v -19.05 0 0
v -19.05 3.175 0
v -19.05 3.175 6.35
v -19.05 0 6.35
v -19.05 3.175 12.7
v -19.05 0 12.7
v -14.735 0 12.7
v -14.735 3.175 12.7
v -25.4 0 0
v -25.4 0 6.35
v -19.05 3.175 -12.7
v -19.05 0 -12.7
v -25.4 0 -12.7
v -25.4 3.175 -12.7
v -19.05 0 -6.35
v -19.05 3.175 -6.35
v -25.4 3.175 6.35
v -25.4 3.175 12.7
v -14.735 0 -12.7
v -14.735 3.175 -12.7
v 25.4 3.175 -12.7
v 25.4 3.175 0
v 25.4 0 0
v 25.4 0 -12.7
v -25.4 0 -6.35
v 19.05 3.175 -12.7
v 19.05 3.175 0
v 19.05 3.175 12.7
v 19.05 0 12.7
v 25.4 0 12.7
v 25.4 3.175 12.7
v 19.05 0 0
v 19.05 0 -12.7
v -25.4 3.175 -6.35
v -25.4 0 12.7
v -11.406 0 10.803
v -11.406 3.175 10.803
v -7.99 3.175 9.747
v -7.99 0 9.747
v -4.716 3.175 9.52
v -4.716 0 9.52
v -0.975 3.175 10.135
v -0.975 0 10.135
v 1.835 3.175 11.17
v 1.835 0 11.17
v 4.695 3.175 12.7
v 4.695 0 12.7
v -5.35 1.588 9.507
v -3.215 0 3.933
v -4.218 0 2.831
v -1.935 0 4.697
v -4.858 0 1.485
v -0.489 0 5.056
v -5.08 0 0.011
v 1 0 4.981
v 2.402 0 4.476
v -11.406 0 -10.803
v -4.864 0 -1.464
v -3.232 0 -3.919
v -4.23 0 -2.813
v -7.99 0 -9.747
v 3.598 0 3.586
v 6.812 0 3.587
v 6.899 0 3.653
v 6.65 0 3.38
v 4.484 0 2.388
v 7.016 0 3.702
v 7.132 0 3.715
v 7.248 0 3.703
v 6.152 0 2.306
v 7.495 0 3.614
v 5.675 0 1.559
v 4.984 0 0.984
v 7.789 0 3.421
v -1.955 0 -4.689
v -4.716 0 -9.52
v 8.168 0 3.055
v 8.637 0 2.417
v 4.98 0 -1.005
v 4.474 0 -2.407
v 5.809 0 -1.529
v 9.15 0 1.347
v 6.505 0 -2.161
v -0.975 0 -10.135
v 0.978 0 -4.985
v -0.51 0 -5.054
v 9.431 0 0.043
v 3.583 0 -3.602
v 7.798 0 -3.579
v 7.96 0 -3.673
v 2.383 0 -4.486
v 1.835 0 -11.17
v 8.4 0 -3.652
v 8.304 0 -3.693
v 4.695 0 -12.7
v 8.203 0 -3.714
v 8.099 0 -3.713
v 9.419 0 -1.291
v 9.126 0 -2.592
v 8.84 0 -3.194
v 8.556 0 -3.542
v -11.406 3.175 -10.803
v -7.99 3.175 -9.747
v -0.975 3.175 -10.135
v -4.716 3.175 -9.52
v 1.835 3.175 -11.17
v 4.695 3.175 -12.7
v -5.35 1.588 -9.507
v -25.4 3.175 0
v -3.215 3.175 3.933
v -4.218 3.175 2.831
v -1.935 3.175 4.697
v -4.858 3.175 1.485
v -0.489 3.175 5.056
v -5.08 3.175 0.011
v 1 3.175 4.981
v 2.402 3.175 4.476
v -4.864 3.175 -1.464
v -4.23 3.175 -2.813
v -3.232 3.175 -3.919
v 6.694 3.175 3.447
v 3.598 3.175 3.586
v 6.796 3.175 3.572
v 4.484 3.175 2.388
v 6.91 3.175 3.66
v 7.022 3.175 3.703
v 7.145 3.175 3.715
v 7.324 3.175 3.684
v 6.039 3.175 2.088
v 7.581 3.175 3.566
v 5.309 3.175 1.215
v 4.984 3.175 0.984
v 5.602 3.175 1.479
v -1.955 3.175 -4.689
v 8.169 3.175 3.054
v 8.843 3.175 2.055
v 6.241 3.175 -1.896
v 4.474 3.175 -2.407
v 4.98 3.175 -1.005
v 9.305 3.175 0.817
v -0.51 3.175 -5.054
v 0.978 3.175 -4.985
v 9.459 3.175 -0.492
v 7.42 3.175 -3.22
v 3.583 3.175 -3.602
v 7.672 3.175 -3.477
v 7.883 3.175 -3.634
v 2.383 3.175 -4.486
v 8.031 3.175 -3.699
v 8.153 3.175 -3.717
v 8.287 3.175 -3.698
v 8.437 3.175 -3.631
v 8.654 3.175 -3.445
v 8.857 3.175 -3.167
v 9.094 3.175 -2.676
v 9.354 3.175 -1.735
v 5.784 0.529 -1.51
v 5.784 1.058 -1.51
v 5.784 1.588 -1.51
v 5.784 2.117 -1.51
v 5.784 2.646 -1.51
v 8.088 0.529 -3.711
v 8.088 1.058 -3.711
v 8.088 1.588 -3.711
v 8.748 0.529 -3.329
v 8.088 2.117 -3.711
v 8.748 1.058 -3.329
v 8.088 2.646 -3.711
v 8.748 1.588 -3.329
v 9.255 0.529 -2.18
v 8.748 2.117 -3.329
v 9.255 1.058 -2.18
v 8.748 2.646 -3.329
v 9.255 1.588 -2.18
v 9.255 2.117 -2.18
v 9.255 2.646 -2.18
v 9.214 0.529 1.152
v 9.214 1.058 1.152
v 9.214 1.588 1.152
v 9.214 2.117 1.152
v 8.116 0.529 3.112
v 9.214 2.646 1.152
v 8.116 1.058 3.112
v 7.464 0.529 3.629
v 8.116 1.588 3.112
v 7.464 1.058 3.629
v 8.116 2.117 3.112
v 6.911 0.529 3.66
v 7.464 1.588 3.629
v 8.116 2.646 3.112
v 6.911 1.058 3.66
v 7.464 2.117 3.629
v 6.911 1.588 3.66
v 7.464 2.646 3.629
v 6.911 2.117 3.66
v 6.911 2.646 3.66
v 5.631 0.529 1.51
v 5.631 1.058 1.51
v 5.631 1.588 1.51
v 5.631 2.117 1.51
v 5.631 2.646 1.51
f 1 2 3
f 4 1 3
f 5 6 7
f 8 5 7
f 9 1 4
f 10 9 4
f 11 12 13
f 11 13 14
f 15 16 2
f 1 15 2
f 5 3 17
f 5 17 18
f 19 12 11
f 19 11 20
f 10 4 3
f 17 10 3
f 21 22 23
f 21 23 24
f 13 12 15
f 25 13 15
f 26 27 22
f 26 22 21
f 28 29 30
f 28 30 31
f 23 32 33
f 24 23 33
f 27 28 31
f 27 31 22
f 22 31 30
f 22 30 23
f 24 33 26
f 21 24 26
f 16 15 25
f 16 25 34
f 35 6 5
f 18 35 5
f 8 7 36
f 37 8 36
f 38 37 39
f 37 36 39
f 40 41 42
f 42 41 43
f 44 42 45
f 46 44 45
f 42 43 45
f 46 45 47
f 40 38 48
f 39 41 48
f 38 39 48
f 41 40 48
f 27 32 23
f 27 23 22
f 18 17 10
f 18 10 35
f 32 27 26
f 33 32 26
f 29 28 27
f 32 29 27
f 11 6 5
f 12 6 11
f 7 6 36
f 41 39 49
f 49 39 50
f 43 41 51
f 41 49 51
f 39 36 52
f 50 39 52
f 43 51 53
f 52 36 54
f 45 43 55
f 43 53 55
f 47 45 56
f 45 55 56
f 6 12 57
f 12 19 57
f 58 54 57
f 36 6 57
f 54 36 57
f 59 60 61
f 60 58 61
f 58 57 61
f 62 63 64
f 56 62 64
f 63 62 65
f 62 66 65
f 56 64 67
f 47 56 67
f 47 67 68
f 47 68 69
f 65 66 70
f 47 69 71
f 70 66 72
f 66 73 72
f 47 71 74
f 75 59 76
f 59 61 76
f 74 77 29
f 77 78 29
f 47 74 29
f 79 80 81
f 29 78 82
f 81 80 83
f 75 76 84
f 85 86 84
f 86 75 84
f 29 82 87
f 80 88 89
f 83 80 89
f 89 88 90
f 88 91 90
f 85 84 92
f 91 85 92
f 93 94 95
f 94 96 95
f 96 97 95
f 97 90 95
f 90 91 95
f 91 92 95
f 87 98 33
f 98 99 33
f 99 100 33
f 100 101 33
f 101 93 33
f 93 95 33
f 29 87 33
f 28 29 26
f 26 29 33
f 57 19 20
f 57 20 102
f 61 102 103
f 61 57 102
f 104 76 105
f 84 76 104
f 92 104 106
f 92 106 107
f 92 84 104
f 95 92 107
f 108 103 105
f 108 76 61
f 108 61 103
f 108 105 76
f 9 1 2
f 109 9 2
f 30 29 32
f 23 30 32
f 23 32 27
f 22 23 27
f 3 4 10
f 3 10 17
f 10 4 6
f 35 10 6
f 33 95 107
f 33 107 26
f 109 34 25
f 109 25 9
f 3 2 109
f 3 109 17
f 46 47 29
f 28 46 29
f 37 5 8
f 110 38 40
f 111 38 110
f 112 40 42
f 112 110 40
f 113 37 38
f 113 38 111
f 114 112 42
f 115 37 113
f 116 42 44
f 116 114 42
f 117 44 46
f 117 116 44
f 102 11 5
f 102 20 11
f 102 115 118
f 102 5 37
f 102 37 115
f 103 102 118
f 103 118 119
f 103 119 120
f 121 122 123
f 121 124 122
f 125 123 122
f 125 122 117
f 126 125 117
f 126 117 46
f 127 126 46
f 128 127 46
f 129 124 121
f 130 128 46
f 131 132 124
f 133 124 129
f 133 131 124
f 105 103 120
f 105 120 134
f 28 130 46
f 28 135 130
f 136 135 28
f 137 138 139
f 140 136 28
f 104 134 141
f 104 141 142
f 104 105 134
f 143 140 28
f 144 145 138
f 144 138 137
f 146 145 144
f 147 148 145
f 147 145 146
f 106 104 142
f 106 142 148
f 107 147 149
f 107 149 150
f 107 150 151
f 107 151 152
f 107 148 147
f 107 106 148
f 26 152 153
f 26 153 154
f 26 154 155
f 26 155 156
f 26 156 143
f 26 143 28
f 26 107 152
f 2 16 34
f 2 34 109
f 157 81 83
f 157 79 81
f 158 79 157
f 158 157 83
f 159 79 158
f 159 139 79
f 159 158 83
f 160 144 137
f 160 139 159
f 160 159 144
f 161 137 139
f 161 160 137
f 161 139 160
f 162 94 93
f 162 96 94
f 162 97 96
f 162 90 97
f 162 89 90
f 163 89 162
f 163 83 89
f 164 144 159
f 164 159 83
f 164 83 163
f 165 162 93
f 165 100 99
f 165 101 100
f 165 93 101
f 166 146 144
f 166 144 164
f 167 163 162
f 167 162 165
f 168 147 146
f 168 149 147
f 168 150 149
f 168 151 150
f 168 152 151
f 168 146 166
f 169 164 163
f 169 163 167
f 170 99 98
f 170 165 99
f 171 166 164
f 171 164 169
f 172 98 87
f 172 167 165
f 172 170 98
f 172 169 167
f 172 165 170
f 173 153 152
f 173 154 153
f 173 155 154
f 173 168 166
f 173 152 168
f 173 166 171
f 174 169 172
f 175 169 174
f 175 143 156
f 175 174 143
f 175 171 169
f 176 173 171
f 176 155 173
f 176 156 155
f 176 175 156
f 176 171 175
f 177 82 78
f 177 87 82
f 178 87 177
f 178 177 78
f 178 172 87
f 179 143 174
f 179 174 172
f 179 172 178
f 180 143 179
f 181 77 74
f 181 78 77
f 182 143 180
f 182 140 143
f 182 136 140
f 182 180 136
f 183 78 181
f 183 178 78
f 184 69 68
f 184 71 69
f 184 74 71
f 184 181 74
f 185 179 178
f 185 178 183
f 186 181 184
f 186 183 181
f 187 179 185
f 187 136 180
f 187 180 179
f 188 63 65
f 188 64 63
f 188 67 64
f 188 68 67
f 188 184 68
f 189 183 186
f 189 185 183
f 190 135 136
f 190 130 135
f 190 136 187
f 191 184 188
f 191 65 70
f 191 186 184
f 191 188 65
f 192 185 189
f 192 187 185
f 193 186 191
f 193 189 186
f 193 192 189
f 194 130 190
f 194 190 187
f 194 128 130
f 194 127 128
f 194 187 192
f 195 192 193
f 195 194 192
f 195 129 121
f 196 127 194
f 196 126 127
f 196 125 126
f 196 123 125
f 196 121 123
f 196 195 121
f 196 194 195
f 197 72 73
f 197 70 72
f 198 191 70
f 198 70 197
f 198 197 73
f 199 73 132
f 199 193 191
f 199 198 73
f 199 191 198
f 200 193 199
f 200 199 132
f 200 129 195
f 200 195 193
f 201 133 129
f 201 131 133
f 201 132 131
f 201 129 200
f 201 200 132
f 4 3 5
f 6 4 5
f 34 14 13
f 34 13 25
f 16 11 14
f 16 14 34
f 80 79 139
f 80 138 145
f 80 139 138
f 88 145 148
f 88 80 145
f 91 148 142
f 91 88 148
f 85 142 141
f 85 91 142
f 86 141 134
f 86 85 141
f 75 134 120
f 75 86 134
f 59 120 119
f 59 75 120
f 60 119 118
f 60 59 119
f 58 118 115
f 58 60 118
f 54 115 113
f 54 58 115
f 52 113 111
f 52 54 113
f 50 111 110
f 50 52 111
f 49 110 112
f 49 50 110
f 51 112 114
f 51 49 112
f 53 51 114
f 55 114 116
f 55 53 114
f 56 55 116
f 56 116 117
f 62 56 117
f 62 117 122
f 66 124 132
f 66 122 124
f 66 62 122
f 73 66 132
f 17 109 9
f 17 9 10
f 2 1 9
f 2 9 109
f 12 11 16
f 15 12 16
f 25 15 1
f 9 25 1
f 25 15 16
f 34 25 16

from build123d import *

# Parameters (mm, degrees)
SKETCH1_W           = 38.1
SKETCH1_H           = 25.4
SKETCH1_R           = 5.08
BOSS_EXTRUDE1_DEPTH = 3.175
SKETCH2_W           = 6.35
SKETCH2_H           = 3.175
BOSS_EXTRUDE3_DEPTH = 6.35
SKETCH2_4_W         = 6.35
SKETCH2_4_H         = 3.175
BOSS_EXTRUDE4_DEPTH = 6.35
SKETCH2_6_W         = 6.35
SKETCH2_6_H         = 3.175
BOSS_EXTRUDE6_DEPTH = 6.35
SKETCH2_7_W         = 6.35
SKETCH2_7_H         = 3.175
BOSS_EXTRUDE7_DEPTH = 6.35
SKETCH4_W           = 12.7
SKETCH4_H           = 3.175
BOSS_EXTRUDE8_DEPTH = 6.35
SKETCH4_3_W         = 12.7
SKETCH4_3_H         = 3.175
BOSS_EXTRUDE9_DEPTH = 6.35
CUT_EXTRUDE2_START  = -3.175
CUT_EXTRUDE2_DEPTH  = 3.175
CUT_EXTRUDE3_DEPTH  = 29.575000056


# Read off the part's stored shape, not the designer's step: Cut-Extrude2
with BuildPart() as part:
    # Sketch1 → Boss-Extrude1 (new body)
    with BuildSketch(Plane(origin=(0, 0, 0), x_dir=(1, 0, 0), z_dir=(0, 1, 0))):
        Rectangle(SKETCH1_W, SKETCH1_H)
        with Locations(Location((0, 0, 0), (0, 0, 270))):
            Circle(SKETCH1_R, mode=Mode.SUBTRACT)
    extrude(amount=BOSS_EXTRUDE1_DEPTH)

    # Cut-Extrude2 outline → Cut-Extrude2 (cut)
    with BuildSketch(Plane(origin=(0, 3.175, 0), x_dir=(1, 0, 0), z_dir=(0, 1, 0)).offset(CUT_EXTRUDE2_START)):
        with BuildLine():
            add(Edge.make_bspline(
                [(-14.734894962, -12.7), (-5.680324338, -6.31376032), (4.695493284, -12.7)],
                knots=[0, 0, 0, 1, 1, 1], degree=2))
            Line((-14.734894962, -12.7), (4.695493284, -12.7))
        make_face()
    cut_extrude2 = extrude(amount=CUT_EXTRUDE2_DEPTH, mode=Mode.SUBTRACT)

    # Mirror1: Cut-Extrude2 across plane
    add(cut_extrude2.mirror(Plane.XY), mode=Mode.SUBTRACT)

    # Sketch7 → Cut-Extrude3 (cut, through all)
    with BuildSketch(Plane(origin=(0, 3.175, 0), x_dir=(1, 0, 0), z_dir=(0, 1, 0))):
        with BuildLine():
            add(Edge.make_bspline(
                [(3.532104769, 0), (3.477676984, 0.390463167), (6.408378563, 1.270008565), (8.429115562, 5.608848412), (10.522151737, -0.769791386), (6.634495042, -4.966480622), (6.193967516, -1.079937843), (3.584000782, -0.372300314), (3.532104769, 0)],
                knots=[0, 0, 0, 0, 0.139904226, 0.304283653, 0.561817952, 0.737518598, 0.866603584, 1, 1, 1, 1], degree=3))
        make_face()
    extrude(amount=-CUT_EXTRUDE3_DEPTH, mode=Mode.SUBTRACT)


with BuildPart() as body_2:
    # Sketch2 → Boss-Extrude3 (new body)
    with BuildSketch(Plane.ZY.offset(19.05)):
        with Locations((-9.525, 1.5875)):
            Rectangle(SKETCH2_W, SKETCH2_H)
    extrude(amount=BOSS_EXTRUDE3_DEPTH)


with BuildPart() as body_3:
    # Sketch2<4> → Boss-Extrude4 (new body)
    with BuildSketch(Plane.ZY.offset(19.05)):
        with Locations((-3.175, 1.5875)):
            Rectangle(SKETCH2_4_W, SKETCH2_4_H)
    extrude(amount=BOSS_EXTRUDE4_DEPTH)


with BuildPart() as body_4:
    # Sketch2<6> → Boss-Extrude6 (new body)
    with BuildSketch(Plane.ZY.offset(19.05)):
        with Locations((3.175, 1.5875)):
            Rectangle(SKETCH2_6_W, SKETCH2_6_H)
    extrude(amount=BOSS_EXTRUDE6_DEPTH)


with BuildPart() as body_5:
    # Sketch2<7> → Boss-Extrude7 (new body)
    with BuildSketch(Plane.ZY.offset(19.05)):
        with Locations((9.525, 1.5875)):
            Rectangle(SKETCH2_7_W, SKETCH2_7_H)
    extrude(amount=BOSS_EXTRUDE7_DEPTH)


with BuildPart() as body_6:
    # Sketch4 → Boss-Extrude8 (new body)
    with BuildSketch(Plane(origin=(19.05, 0, 0), x_dir=(0, 0, -1), z_dir=(1, 0, 0))):
        with Locations((-6.35, 1.5875)):
            Rectangle(SKETCH4_W, SKETCH4_H)
    extrude(amount=BOSS_EXTRUDE8_DEPTH)


with BuildPart() as body_7:
    # Sketch4<3> → Boss-Extrude9 (new body)
    with BuildSketch(Plane(origin=(19.05, 0, 0), x_dir=(0, 0, -1), z_dir=(1, 0, 0))):
        with Locations((6.35, 1.5875)):
            Rectangle(SKETCH4_3_W, SKETCH4_3_H)
    extrude(amount=BOSS_EXTRUDE9_DEPTH)


solid = Compound([part.part, body_2.part, body_3.part, body_4.part, body_5.part, body_6.part, body_7.part])
